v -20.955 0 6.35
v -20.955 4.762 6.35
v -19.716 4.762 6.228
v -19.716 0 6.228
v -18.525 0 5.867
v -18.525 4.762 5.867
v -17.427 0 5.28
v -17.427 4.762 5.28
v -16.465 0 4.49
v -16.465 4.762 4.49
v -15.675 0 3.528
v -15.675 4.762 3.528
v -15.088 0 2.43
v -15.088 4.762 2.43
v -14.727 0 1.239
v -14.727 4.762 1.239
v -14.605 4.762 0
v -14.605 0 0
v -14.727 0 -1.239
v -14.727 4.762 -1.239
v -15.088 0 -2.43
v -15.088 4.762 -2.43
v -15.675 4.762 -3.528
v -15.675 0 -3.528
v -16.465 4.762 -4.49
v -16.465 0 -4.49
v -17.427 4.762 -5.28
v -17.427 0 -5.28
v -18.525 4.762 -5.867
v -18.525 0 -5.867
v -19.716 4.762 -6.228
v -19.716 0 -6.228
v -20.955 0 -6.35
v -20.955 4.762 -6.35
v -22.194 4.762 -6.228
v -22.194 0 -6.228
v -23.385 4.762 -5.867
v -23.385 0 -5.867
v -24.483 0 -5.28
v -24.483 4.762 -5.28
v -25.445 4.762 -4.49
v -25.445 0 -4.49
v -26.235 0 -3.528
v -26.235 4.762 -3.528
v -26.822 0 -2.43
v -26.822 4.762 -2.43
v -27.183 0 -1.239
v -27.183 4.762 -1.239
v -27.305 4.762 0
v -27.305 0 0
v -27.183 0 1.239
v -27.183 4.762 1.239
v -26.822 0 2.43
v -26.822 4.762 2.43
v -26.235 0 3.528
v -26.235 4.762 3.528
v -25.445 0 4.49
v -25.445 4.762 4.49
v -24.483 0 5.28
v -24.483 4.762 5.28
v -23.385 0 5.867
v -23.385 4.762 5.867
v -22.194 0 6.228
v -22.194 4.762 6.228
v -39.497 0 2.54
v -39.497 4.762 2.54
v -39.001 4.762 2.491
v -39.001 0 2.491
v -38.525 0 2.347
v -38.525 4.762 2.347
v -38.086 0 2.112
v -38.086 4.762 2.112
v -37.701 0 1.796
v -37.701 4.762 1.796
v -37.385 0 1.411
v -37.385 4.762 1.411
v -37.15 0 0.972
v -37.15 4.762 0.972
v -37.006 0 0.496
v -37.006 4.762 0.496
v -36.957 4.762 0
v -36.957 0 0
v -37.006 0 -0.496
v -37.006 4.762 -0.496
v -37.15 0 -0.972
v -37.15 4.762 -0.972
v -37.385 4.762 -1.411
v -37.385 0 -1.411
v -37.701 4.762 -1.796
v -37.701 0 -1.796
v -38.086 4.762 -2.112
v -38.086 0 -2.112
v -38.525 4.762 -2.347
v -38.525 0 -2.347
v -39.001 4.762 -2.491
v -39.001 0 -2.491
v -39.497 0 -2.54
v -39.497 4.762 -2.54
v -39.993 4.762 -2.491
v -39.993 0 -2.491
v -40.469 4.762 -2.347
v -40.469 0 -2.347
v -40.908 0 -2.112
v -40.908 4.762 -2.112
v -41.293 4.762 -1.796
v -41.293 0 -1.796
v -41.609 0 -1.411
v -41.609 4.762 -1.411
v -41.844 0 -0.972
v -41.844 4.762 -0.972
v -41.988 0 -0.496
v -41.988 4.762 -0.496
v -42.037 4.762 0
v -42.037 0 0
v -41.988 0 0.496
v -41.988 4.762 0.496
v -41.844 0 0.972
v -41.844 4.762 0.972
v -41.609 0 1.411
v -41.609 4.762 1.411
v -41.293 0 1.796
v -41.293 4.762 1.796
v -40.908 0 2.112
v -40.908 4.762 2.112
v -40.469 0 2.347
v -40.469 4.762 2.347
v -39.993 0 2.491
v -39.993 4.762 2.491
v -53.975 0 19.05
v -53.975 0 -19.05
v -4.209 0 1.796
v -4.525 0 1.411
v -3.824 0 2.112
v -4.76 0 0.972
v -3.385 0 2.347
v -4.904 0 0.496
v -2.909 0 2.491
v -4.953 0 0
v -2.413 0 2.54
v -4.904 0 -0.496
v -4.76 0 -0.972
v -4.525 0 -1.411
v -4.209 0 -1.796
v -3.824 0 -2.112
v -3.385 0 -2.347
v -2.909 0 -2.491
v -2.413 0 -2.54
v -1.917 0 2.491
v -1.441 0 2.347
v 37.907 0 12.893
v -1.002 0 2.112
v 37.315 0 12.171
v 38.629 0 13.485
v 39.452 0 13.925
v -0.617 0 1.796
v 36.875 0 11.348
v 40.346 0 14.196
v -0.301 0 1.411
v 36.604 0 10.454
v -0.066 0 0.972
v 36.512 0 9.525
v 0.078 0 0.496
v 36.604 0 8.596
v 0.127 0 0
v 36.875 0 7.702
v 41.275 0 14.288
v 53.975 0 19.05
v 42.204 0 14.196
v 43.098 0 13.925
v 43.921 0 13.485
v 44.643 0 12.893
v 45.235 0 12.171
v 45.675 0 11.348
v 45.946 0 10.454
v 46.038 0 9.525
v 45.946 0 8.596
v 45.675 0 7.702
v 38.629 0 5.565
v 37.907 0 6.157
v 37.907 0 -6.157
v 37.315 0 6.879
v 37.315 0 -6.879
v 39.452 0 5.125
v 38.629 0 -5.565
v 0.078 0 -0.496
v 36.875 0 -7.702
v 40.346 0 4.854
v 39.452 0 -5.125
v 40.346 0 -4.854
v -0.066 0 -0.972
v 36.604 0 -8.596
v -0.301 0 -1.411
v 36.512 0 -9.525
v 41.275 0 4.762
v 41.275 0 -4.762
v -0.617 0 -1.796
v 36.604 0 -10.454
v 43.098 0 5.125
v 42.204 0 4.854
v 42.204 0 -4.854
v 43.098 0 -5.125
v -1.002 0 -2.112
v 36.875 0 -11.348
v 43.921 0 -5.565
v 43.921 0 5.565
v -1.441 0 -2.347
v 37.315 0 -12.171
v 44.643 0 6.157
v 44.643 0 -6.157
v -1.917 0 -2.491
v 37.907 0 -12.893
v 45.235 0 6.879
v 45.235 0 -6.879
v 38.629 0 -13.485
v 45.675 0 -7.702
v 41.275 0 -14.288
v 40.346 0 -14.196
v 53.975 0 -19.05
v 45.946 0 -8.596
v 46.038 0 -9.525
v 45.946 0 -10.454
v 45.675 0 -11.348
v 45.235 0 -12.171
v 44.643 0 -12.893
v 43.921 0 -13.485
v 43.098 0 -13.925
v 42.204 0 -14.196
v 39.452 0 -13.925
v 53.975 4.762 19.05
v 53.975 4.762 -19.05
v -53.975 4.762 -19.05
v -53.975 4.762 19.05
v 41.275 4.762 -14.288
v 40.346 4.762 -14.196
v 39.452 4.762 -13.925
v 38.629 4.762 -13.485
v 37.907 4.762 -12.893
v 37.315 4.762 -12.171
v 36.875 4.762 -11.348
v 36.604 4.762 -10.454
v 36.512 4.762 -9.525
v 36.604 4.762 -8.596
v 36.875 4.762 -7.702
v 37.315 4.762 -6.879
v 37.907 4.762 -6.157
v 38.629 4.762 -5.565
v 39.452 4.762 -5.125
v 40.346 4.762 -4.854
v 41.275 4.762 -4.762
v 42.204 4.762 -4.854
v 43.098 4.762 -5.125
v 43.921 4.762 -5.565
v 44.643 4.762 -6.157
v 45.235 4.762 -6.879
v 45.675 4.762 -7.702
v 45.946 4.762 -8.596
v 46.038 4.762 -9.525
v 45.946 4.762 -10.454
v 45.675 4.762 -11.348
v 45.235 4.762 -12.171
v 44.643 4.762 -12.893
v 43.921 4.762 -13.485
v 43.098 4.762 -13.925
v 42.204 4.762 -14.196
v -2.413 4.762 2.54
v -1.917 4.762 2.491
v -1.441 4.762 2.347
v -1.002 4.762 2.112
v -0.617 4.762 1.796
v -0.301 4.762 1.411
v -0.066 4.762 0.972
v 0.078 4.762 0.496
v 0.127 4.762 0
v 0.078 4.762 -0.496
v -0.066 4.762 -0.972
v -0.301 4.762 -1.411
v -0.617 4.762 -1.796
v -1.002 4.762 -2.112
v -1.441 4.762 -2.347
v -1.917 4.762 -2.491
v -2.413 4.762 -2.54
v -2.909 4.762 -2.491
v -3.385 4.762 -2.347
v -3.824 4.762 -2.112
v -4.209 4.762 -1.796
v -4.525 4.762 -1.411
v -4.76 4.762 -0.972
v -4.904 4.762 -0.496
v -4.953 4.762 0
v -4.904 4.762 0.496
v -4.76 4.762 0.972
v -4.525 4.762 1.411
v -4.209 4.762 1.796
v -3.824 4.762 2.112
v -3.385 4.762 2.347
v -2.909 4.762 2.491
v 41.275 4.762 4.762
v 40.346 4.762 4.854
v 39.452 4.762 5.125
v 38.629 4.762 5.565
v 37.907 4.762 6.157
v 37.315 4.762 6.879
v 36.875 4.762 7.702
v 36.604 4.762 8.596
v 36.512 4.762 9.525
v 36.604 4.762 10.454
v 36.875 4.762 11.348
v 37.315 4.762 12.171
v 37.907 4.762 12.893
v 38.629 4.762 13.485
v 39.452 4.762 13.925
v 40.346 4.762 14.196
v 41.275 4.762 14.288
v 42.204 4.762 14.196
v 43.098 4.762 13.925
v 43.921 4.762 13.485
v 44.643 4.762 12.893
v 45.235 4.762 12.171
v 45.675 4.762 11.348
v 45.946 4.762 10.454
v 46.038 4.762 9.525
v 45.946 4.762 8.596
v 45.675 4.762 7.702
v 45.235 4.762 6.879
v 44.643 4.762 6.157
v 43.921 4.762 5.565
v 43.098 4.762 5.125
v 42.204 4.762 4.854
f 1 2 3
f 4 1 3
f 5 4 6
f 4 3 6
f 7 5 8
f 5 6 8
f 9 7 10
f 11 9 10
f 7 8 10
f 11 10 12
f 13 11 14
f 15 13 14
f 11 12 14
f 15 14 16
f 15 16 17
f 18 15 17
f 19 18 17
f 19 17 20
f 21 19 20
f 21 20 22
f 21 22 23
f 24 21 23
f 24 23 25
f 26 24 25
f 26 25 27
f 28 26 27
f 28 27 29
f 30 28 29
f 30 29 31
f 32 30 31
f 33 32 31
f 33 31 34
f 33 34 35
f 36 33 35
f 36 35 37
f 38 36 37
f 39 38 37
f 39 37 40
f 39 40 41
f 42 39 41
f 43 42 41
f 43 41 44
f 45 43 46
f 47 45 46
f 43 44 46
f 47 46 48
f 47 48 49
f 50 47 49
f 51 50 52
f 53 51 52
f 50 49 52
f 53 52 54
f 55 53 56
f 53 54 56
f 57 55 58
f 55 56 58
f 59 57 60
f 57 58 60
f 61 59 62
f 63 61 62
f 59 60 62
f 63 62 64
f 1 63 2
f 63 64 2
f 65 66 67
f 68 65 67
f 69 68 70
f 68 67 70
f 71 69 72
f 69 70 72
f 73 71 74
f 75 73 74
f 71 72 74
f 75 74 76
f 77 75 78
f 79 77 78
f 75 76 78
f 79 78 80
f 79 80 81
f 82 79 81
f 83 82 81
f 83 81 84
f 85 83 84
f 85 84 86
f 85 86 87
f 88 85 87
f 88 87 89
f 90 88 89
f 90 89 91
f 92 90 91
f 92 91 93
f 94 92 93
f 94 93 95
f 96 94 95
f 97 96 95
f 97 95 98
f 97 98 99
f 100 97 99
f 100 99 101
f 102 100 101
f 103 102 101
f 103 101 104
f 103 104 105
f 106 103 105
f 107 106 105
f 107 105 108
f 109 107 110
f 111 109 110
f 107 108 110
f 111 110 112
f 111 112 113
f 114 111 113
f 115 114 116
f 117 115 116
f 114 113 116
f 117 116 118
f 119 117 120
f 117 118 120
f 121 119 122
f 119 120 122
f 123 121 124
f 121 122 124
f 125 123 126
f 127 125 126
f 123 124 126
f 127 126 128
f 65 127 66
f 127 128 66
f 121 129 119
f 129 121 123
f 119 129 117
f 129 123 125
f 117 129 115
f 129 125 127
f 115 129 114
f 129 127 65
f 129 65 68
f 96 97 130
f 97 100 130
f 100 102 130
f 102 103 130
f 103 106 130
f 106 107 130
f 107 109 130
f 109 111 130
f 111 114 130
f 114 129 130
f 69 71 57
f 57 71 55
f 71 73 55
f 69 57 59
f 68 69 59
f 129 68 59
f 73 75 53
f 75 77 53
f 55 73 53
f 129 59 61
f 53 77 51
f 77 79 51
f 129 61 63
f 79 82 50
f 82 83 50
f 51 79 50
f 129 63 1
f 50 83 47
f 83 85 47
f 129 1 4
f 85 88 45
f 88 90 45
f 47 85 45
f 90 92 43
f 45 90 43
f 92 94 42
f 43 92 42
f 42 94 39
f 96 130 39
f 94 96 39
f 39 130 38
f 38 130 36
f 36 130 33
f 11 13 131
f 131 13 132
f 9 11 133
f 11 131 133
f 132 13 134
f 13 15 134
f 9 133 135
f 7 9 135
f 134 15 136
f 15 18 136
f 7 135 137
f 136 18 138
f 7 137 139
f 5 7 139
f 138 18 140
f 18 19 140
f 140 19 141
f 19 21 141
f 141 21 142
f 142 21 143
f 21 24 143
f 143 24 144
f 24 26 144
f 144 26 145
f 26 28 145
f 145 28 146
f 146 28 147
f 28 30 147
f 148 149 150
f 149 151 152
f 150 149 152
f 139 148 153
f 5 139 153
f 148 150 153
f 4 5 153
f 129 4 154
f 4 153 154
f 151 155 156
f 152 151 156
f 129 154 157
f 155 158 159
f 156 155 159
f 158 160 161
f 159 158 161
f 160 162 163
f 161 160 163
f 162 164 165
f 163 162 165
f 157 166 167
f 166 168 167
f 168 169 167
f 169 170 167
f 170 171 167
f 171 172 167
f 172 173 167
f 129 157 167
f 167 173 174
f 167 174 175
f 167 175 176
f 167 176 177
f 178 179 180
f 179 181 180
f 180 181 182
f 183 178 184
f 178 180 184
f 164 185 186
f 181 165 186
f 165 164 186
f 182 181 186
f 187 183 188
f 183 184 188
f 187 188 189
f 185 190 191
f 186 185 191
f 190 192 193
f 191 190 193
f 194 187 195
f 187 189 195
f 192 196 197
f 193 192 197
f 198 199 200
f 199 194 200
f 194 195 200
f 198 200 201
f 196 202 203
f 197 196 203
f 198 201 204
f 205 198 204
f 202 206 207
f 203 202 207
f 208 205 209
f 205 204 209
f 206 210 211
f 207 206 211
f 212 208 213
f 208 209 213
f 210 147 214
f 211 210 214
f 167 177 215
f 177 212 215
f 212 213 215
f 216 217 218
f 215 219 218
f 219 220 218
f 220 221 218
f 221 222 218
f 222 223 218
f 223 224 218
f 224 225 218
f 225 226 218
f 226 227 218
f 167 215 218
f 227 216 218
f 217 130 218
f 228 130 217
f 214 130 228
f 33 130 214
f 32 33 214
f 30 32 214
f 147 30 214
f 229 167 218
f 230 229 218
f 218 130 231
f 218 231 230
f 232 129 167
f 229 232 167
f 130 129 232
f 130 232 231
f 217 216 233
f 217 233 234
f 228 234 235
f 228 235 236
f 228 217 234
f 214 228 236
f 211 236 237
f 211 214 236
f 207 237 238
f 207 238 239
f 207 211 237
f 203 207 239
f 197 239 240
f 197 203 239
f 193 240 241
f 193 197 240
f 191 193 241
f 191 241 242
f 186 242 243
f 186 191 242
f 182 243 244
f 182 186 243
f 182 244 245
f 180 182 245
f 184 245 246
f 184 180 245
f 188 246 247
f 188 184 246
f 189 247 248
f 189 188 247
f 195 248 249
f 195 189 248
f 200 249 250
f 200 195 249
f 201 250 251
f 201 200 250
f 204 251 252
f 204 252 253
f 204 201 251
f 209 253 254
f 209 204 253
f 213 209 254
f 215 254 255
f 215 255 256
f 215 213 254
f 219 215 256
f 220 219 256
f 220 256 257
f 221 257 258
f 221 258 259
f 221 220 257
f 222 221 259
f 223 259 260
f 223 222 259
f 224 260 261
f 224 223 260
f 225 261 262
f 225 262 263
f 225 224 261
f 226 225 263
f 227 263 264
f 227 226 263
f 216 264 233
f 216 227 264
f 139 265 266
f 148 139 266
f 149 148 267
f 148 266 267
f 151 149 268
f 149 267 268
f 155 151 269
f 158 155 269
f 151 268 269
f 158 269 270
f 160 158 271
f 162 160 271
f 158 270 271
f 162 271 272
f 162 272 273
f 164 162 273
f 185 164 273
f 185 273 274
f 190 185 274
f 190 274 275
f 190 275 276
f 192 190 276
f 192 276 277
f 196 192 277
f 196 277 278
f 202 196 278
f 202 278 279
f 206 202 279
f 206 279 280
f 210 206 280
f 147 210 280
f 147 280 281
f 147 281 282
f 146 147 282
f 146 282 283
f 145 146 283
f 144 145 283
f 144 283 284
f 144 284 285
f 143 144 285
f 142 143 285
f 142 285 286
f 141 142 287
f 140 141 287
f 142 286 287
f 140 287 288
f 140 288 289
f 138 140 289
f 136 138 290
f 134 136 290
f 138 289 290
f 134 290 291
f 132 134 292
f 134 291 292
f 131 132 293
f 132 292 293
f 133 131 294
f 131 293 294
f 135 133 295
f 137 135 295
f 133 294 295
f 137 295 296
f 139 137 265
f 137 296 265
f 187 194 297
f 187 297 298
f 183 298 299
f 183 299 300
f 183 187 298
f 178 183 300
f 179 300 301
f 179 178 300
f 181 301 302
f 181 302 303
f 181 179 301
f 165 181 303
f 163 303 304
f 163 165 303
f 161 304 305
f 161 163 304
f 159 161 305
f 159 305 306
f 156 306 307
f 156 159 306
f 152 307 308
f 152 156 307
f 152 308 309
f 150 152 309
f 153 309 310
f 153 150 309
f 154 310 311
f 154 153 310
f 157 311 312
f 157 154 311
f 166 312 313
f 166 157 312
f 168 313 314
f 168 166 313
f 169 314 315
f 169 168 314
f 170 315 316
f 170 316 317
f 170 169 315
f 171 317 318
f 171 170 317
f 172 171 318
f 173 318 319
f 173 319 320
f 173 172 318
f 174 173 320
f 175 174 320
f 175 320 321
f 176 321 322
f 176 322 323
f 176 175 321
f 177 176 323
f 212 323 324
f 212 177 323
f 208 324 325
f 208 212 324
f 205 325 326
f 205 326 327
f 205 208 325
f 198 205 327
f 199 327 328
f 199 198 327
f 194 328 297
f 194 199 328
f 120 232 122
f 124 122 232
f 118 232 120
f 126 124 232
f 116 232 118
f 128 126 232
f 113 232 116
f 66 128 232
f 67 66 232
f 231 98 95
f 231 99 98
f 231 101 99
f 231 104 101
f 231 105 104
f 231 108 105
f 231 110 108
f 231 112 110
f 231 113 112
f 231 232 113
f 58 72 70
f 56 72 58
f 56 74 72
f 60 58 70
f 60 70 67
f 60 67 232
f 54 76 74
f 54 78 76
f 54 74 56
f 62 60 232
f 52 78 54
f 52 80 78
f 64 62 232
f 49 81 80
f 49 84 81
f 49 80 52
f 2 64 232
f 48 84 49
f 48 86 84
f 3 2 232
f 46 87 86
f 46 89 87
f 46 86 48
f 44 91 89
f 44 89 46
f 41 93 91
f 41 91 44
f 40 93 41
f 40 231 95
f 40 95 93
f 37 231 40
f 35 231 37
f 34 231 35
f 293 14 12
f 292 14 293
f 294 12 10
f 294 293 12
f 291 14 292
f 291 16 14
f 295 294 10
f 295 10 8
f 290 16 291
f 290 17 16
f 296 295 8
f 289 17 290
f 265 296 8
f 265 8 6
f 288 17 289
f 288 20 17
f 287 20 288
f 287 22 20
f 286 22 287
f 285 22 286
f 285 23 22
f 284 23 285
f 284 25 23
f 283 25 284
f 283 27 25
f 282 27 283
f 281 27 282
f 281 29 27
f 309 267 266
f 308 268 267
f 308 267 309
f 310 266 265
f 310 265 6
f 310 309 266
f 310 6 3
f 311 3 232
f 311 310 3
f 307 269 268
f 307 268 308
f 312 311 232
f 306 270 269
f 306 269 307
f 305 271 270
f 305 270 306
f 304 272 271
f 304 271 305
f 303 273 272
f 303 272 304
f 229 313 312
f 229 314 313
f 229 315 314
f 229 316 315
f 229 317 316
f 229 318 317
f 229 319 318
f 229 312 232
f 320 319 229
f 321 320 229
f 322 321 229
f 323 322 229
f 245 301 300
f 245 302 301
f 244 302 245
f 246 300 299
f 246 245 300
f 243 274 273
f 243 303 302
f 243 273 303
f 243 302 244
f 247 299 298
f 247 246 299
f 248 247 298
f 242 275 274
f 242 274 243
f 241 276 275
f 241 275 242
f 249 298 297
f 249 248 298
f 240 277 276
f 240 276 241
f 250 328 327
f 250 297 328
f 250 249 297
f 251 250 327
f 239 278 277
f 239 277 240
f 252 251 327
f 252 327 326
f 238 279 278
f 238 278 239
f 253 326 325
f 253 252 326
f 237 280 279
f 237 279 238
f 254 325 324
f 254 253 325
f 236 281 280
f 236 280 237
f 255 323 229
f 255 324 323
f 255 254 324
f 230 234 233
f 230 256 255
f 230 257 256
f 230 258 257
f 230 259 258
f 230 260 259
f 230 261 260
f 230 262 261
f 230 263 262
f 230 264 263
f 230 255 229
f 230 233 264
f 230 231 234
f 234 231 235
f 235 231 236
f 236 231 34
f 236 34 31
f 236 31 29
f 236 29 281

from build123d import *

# Parameters (mm, degrees)
SKETCH2_W           = 107.95
SKETCH2_H           = 38.1
SKETCH2_R           = 4.7625
BOSS_EXTRUDE1_DEPTH = 4.7625
SKETCH3_R           = 2.54
SKETCH3_R_2         = 6.35
CUT_EXTRUDE1_DEPTH  = 58.435916736


with BuildPart() as part:
    # Sketch2 → Boss-Extrude1 (new body)
    with BuildSketch(Plane(origin=(0, 0, 0), x_dir=(1, 0, 0), z_dir=(0, 1, 0))):
        Rectangle(SKETCH2_W, SKETCH2_H)
        with Locations(Location((41.275, 9.525, 0), (0, 0, 90))):
            Circle(SKETCH2_R, mode=Mode.SUBTRACT)
        with Locations(Location((41.275, -9.525, 0), (0, 0, 90))):
            Circle(SKETCH2_R, mode=Mode.SUBTRACT)
    extrude(amount=BOSS_EXTRUDE1_DEPTH)

    # Sketch3 → Cut-Extrude1 (cut, through all)
    with BuildSketch(Plane(origin=(0, 4.7625, 0), x_dir=(1, 0, 0), z_dir=(0, 1, 0))):
        with Locations(Location((-39.497, 0, 0), (0, 0, 270))):
            Circle(SKETCH3_R)
        with Locations(Location((-2.413, 0, 0), (0, 0, 270))):
            Circle(SKETCH3_R)
        with Locations(Location((-20.955, 0, 0), (0, 0, 270))):
            Circle(SKETCH3_R_2)
    extrude(amount=-CUT_EXTRUDE1_DEPTH, mode=Mode.SUBTRACT)


solid = part.part
